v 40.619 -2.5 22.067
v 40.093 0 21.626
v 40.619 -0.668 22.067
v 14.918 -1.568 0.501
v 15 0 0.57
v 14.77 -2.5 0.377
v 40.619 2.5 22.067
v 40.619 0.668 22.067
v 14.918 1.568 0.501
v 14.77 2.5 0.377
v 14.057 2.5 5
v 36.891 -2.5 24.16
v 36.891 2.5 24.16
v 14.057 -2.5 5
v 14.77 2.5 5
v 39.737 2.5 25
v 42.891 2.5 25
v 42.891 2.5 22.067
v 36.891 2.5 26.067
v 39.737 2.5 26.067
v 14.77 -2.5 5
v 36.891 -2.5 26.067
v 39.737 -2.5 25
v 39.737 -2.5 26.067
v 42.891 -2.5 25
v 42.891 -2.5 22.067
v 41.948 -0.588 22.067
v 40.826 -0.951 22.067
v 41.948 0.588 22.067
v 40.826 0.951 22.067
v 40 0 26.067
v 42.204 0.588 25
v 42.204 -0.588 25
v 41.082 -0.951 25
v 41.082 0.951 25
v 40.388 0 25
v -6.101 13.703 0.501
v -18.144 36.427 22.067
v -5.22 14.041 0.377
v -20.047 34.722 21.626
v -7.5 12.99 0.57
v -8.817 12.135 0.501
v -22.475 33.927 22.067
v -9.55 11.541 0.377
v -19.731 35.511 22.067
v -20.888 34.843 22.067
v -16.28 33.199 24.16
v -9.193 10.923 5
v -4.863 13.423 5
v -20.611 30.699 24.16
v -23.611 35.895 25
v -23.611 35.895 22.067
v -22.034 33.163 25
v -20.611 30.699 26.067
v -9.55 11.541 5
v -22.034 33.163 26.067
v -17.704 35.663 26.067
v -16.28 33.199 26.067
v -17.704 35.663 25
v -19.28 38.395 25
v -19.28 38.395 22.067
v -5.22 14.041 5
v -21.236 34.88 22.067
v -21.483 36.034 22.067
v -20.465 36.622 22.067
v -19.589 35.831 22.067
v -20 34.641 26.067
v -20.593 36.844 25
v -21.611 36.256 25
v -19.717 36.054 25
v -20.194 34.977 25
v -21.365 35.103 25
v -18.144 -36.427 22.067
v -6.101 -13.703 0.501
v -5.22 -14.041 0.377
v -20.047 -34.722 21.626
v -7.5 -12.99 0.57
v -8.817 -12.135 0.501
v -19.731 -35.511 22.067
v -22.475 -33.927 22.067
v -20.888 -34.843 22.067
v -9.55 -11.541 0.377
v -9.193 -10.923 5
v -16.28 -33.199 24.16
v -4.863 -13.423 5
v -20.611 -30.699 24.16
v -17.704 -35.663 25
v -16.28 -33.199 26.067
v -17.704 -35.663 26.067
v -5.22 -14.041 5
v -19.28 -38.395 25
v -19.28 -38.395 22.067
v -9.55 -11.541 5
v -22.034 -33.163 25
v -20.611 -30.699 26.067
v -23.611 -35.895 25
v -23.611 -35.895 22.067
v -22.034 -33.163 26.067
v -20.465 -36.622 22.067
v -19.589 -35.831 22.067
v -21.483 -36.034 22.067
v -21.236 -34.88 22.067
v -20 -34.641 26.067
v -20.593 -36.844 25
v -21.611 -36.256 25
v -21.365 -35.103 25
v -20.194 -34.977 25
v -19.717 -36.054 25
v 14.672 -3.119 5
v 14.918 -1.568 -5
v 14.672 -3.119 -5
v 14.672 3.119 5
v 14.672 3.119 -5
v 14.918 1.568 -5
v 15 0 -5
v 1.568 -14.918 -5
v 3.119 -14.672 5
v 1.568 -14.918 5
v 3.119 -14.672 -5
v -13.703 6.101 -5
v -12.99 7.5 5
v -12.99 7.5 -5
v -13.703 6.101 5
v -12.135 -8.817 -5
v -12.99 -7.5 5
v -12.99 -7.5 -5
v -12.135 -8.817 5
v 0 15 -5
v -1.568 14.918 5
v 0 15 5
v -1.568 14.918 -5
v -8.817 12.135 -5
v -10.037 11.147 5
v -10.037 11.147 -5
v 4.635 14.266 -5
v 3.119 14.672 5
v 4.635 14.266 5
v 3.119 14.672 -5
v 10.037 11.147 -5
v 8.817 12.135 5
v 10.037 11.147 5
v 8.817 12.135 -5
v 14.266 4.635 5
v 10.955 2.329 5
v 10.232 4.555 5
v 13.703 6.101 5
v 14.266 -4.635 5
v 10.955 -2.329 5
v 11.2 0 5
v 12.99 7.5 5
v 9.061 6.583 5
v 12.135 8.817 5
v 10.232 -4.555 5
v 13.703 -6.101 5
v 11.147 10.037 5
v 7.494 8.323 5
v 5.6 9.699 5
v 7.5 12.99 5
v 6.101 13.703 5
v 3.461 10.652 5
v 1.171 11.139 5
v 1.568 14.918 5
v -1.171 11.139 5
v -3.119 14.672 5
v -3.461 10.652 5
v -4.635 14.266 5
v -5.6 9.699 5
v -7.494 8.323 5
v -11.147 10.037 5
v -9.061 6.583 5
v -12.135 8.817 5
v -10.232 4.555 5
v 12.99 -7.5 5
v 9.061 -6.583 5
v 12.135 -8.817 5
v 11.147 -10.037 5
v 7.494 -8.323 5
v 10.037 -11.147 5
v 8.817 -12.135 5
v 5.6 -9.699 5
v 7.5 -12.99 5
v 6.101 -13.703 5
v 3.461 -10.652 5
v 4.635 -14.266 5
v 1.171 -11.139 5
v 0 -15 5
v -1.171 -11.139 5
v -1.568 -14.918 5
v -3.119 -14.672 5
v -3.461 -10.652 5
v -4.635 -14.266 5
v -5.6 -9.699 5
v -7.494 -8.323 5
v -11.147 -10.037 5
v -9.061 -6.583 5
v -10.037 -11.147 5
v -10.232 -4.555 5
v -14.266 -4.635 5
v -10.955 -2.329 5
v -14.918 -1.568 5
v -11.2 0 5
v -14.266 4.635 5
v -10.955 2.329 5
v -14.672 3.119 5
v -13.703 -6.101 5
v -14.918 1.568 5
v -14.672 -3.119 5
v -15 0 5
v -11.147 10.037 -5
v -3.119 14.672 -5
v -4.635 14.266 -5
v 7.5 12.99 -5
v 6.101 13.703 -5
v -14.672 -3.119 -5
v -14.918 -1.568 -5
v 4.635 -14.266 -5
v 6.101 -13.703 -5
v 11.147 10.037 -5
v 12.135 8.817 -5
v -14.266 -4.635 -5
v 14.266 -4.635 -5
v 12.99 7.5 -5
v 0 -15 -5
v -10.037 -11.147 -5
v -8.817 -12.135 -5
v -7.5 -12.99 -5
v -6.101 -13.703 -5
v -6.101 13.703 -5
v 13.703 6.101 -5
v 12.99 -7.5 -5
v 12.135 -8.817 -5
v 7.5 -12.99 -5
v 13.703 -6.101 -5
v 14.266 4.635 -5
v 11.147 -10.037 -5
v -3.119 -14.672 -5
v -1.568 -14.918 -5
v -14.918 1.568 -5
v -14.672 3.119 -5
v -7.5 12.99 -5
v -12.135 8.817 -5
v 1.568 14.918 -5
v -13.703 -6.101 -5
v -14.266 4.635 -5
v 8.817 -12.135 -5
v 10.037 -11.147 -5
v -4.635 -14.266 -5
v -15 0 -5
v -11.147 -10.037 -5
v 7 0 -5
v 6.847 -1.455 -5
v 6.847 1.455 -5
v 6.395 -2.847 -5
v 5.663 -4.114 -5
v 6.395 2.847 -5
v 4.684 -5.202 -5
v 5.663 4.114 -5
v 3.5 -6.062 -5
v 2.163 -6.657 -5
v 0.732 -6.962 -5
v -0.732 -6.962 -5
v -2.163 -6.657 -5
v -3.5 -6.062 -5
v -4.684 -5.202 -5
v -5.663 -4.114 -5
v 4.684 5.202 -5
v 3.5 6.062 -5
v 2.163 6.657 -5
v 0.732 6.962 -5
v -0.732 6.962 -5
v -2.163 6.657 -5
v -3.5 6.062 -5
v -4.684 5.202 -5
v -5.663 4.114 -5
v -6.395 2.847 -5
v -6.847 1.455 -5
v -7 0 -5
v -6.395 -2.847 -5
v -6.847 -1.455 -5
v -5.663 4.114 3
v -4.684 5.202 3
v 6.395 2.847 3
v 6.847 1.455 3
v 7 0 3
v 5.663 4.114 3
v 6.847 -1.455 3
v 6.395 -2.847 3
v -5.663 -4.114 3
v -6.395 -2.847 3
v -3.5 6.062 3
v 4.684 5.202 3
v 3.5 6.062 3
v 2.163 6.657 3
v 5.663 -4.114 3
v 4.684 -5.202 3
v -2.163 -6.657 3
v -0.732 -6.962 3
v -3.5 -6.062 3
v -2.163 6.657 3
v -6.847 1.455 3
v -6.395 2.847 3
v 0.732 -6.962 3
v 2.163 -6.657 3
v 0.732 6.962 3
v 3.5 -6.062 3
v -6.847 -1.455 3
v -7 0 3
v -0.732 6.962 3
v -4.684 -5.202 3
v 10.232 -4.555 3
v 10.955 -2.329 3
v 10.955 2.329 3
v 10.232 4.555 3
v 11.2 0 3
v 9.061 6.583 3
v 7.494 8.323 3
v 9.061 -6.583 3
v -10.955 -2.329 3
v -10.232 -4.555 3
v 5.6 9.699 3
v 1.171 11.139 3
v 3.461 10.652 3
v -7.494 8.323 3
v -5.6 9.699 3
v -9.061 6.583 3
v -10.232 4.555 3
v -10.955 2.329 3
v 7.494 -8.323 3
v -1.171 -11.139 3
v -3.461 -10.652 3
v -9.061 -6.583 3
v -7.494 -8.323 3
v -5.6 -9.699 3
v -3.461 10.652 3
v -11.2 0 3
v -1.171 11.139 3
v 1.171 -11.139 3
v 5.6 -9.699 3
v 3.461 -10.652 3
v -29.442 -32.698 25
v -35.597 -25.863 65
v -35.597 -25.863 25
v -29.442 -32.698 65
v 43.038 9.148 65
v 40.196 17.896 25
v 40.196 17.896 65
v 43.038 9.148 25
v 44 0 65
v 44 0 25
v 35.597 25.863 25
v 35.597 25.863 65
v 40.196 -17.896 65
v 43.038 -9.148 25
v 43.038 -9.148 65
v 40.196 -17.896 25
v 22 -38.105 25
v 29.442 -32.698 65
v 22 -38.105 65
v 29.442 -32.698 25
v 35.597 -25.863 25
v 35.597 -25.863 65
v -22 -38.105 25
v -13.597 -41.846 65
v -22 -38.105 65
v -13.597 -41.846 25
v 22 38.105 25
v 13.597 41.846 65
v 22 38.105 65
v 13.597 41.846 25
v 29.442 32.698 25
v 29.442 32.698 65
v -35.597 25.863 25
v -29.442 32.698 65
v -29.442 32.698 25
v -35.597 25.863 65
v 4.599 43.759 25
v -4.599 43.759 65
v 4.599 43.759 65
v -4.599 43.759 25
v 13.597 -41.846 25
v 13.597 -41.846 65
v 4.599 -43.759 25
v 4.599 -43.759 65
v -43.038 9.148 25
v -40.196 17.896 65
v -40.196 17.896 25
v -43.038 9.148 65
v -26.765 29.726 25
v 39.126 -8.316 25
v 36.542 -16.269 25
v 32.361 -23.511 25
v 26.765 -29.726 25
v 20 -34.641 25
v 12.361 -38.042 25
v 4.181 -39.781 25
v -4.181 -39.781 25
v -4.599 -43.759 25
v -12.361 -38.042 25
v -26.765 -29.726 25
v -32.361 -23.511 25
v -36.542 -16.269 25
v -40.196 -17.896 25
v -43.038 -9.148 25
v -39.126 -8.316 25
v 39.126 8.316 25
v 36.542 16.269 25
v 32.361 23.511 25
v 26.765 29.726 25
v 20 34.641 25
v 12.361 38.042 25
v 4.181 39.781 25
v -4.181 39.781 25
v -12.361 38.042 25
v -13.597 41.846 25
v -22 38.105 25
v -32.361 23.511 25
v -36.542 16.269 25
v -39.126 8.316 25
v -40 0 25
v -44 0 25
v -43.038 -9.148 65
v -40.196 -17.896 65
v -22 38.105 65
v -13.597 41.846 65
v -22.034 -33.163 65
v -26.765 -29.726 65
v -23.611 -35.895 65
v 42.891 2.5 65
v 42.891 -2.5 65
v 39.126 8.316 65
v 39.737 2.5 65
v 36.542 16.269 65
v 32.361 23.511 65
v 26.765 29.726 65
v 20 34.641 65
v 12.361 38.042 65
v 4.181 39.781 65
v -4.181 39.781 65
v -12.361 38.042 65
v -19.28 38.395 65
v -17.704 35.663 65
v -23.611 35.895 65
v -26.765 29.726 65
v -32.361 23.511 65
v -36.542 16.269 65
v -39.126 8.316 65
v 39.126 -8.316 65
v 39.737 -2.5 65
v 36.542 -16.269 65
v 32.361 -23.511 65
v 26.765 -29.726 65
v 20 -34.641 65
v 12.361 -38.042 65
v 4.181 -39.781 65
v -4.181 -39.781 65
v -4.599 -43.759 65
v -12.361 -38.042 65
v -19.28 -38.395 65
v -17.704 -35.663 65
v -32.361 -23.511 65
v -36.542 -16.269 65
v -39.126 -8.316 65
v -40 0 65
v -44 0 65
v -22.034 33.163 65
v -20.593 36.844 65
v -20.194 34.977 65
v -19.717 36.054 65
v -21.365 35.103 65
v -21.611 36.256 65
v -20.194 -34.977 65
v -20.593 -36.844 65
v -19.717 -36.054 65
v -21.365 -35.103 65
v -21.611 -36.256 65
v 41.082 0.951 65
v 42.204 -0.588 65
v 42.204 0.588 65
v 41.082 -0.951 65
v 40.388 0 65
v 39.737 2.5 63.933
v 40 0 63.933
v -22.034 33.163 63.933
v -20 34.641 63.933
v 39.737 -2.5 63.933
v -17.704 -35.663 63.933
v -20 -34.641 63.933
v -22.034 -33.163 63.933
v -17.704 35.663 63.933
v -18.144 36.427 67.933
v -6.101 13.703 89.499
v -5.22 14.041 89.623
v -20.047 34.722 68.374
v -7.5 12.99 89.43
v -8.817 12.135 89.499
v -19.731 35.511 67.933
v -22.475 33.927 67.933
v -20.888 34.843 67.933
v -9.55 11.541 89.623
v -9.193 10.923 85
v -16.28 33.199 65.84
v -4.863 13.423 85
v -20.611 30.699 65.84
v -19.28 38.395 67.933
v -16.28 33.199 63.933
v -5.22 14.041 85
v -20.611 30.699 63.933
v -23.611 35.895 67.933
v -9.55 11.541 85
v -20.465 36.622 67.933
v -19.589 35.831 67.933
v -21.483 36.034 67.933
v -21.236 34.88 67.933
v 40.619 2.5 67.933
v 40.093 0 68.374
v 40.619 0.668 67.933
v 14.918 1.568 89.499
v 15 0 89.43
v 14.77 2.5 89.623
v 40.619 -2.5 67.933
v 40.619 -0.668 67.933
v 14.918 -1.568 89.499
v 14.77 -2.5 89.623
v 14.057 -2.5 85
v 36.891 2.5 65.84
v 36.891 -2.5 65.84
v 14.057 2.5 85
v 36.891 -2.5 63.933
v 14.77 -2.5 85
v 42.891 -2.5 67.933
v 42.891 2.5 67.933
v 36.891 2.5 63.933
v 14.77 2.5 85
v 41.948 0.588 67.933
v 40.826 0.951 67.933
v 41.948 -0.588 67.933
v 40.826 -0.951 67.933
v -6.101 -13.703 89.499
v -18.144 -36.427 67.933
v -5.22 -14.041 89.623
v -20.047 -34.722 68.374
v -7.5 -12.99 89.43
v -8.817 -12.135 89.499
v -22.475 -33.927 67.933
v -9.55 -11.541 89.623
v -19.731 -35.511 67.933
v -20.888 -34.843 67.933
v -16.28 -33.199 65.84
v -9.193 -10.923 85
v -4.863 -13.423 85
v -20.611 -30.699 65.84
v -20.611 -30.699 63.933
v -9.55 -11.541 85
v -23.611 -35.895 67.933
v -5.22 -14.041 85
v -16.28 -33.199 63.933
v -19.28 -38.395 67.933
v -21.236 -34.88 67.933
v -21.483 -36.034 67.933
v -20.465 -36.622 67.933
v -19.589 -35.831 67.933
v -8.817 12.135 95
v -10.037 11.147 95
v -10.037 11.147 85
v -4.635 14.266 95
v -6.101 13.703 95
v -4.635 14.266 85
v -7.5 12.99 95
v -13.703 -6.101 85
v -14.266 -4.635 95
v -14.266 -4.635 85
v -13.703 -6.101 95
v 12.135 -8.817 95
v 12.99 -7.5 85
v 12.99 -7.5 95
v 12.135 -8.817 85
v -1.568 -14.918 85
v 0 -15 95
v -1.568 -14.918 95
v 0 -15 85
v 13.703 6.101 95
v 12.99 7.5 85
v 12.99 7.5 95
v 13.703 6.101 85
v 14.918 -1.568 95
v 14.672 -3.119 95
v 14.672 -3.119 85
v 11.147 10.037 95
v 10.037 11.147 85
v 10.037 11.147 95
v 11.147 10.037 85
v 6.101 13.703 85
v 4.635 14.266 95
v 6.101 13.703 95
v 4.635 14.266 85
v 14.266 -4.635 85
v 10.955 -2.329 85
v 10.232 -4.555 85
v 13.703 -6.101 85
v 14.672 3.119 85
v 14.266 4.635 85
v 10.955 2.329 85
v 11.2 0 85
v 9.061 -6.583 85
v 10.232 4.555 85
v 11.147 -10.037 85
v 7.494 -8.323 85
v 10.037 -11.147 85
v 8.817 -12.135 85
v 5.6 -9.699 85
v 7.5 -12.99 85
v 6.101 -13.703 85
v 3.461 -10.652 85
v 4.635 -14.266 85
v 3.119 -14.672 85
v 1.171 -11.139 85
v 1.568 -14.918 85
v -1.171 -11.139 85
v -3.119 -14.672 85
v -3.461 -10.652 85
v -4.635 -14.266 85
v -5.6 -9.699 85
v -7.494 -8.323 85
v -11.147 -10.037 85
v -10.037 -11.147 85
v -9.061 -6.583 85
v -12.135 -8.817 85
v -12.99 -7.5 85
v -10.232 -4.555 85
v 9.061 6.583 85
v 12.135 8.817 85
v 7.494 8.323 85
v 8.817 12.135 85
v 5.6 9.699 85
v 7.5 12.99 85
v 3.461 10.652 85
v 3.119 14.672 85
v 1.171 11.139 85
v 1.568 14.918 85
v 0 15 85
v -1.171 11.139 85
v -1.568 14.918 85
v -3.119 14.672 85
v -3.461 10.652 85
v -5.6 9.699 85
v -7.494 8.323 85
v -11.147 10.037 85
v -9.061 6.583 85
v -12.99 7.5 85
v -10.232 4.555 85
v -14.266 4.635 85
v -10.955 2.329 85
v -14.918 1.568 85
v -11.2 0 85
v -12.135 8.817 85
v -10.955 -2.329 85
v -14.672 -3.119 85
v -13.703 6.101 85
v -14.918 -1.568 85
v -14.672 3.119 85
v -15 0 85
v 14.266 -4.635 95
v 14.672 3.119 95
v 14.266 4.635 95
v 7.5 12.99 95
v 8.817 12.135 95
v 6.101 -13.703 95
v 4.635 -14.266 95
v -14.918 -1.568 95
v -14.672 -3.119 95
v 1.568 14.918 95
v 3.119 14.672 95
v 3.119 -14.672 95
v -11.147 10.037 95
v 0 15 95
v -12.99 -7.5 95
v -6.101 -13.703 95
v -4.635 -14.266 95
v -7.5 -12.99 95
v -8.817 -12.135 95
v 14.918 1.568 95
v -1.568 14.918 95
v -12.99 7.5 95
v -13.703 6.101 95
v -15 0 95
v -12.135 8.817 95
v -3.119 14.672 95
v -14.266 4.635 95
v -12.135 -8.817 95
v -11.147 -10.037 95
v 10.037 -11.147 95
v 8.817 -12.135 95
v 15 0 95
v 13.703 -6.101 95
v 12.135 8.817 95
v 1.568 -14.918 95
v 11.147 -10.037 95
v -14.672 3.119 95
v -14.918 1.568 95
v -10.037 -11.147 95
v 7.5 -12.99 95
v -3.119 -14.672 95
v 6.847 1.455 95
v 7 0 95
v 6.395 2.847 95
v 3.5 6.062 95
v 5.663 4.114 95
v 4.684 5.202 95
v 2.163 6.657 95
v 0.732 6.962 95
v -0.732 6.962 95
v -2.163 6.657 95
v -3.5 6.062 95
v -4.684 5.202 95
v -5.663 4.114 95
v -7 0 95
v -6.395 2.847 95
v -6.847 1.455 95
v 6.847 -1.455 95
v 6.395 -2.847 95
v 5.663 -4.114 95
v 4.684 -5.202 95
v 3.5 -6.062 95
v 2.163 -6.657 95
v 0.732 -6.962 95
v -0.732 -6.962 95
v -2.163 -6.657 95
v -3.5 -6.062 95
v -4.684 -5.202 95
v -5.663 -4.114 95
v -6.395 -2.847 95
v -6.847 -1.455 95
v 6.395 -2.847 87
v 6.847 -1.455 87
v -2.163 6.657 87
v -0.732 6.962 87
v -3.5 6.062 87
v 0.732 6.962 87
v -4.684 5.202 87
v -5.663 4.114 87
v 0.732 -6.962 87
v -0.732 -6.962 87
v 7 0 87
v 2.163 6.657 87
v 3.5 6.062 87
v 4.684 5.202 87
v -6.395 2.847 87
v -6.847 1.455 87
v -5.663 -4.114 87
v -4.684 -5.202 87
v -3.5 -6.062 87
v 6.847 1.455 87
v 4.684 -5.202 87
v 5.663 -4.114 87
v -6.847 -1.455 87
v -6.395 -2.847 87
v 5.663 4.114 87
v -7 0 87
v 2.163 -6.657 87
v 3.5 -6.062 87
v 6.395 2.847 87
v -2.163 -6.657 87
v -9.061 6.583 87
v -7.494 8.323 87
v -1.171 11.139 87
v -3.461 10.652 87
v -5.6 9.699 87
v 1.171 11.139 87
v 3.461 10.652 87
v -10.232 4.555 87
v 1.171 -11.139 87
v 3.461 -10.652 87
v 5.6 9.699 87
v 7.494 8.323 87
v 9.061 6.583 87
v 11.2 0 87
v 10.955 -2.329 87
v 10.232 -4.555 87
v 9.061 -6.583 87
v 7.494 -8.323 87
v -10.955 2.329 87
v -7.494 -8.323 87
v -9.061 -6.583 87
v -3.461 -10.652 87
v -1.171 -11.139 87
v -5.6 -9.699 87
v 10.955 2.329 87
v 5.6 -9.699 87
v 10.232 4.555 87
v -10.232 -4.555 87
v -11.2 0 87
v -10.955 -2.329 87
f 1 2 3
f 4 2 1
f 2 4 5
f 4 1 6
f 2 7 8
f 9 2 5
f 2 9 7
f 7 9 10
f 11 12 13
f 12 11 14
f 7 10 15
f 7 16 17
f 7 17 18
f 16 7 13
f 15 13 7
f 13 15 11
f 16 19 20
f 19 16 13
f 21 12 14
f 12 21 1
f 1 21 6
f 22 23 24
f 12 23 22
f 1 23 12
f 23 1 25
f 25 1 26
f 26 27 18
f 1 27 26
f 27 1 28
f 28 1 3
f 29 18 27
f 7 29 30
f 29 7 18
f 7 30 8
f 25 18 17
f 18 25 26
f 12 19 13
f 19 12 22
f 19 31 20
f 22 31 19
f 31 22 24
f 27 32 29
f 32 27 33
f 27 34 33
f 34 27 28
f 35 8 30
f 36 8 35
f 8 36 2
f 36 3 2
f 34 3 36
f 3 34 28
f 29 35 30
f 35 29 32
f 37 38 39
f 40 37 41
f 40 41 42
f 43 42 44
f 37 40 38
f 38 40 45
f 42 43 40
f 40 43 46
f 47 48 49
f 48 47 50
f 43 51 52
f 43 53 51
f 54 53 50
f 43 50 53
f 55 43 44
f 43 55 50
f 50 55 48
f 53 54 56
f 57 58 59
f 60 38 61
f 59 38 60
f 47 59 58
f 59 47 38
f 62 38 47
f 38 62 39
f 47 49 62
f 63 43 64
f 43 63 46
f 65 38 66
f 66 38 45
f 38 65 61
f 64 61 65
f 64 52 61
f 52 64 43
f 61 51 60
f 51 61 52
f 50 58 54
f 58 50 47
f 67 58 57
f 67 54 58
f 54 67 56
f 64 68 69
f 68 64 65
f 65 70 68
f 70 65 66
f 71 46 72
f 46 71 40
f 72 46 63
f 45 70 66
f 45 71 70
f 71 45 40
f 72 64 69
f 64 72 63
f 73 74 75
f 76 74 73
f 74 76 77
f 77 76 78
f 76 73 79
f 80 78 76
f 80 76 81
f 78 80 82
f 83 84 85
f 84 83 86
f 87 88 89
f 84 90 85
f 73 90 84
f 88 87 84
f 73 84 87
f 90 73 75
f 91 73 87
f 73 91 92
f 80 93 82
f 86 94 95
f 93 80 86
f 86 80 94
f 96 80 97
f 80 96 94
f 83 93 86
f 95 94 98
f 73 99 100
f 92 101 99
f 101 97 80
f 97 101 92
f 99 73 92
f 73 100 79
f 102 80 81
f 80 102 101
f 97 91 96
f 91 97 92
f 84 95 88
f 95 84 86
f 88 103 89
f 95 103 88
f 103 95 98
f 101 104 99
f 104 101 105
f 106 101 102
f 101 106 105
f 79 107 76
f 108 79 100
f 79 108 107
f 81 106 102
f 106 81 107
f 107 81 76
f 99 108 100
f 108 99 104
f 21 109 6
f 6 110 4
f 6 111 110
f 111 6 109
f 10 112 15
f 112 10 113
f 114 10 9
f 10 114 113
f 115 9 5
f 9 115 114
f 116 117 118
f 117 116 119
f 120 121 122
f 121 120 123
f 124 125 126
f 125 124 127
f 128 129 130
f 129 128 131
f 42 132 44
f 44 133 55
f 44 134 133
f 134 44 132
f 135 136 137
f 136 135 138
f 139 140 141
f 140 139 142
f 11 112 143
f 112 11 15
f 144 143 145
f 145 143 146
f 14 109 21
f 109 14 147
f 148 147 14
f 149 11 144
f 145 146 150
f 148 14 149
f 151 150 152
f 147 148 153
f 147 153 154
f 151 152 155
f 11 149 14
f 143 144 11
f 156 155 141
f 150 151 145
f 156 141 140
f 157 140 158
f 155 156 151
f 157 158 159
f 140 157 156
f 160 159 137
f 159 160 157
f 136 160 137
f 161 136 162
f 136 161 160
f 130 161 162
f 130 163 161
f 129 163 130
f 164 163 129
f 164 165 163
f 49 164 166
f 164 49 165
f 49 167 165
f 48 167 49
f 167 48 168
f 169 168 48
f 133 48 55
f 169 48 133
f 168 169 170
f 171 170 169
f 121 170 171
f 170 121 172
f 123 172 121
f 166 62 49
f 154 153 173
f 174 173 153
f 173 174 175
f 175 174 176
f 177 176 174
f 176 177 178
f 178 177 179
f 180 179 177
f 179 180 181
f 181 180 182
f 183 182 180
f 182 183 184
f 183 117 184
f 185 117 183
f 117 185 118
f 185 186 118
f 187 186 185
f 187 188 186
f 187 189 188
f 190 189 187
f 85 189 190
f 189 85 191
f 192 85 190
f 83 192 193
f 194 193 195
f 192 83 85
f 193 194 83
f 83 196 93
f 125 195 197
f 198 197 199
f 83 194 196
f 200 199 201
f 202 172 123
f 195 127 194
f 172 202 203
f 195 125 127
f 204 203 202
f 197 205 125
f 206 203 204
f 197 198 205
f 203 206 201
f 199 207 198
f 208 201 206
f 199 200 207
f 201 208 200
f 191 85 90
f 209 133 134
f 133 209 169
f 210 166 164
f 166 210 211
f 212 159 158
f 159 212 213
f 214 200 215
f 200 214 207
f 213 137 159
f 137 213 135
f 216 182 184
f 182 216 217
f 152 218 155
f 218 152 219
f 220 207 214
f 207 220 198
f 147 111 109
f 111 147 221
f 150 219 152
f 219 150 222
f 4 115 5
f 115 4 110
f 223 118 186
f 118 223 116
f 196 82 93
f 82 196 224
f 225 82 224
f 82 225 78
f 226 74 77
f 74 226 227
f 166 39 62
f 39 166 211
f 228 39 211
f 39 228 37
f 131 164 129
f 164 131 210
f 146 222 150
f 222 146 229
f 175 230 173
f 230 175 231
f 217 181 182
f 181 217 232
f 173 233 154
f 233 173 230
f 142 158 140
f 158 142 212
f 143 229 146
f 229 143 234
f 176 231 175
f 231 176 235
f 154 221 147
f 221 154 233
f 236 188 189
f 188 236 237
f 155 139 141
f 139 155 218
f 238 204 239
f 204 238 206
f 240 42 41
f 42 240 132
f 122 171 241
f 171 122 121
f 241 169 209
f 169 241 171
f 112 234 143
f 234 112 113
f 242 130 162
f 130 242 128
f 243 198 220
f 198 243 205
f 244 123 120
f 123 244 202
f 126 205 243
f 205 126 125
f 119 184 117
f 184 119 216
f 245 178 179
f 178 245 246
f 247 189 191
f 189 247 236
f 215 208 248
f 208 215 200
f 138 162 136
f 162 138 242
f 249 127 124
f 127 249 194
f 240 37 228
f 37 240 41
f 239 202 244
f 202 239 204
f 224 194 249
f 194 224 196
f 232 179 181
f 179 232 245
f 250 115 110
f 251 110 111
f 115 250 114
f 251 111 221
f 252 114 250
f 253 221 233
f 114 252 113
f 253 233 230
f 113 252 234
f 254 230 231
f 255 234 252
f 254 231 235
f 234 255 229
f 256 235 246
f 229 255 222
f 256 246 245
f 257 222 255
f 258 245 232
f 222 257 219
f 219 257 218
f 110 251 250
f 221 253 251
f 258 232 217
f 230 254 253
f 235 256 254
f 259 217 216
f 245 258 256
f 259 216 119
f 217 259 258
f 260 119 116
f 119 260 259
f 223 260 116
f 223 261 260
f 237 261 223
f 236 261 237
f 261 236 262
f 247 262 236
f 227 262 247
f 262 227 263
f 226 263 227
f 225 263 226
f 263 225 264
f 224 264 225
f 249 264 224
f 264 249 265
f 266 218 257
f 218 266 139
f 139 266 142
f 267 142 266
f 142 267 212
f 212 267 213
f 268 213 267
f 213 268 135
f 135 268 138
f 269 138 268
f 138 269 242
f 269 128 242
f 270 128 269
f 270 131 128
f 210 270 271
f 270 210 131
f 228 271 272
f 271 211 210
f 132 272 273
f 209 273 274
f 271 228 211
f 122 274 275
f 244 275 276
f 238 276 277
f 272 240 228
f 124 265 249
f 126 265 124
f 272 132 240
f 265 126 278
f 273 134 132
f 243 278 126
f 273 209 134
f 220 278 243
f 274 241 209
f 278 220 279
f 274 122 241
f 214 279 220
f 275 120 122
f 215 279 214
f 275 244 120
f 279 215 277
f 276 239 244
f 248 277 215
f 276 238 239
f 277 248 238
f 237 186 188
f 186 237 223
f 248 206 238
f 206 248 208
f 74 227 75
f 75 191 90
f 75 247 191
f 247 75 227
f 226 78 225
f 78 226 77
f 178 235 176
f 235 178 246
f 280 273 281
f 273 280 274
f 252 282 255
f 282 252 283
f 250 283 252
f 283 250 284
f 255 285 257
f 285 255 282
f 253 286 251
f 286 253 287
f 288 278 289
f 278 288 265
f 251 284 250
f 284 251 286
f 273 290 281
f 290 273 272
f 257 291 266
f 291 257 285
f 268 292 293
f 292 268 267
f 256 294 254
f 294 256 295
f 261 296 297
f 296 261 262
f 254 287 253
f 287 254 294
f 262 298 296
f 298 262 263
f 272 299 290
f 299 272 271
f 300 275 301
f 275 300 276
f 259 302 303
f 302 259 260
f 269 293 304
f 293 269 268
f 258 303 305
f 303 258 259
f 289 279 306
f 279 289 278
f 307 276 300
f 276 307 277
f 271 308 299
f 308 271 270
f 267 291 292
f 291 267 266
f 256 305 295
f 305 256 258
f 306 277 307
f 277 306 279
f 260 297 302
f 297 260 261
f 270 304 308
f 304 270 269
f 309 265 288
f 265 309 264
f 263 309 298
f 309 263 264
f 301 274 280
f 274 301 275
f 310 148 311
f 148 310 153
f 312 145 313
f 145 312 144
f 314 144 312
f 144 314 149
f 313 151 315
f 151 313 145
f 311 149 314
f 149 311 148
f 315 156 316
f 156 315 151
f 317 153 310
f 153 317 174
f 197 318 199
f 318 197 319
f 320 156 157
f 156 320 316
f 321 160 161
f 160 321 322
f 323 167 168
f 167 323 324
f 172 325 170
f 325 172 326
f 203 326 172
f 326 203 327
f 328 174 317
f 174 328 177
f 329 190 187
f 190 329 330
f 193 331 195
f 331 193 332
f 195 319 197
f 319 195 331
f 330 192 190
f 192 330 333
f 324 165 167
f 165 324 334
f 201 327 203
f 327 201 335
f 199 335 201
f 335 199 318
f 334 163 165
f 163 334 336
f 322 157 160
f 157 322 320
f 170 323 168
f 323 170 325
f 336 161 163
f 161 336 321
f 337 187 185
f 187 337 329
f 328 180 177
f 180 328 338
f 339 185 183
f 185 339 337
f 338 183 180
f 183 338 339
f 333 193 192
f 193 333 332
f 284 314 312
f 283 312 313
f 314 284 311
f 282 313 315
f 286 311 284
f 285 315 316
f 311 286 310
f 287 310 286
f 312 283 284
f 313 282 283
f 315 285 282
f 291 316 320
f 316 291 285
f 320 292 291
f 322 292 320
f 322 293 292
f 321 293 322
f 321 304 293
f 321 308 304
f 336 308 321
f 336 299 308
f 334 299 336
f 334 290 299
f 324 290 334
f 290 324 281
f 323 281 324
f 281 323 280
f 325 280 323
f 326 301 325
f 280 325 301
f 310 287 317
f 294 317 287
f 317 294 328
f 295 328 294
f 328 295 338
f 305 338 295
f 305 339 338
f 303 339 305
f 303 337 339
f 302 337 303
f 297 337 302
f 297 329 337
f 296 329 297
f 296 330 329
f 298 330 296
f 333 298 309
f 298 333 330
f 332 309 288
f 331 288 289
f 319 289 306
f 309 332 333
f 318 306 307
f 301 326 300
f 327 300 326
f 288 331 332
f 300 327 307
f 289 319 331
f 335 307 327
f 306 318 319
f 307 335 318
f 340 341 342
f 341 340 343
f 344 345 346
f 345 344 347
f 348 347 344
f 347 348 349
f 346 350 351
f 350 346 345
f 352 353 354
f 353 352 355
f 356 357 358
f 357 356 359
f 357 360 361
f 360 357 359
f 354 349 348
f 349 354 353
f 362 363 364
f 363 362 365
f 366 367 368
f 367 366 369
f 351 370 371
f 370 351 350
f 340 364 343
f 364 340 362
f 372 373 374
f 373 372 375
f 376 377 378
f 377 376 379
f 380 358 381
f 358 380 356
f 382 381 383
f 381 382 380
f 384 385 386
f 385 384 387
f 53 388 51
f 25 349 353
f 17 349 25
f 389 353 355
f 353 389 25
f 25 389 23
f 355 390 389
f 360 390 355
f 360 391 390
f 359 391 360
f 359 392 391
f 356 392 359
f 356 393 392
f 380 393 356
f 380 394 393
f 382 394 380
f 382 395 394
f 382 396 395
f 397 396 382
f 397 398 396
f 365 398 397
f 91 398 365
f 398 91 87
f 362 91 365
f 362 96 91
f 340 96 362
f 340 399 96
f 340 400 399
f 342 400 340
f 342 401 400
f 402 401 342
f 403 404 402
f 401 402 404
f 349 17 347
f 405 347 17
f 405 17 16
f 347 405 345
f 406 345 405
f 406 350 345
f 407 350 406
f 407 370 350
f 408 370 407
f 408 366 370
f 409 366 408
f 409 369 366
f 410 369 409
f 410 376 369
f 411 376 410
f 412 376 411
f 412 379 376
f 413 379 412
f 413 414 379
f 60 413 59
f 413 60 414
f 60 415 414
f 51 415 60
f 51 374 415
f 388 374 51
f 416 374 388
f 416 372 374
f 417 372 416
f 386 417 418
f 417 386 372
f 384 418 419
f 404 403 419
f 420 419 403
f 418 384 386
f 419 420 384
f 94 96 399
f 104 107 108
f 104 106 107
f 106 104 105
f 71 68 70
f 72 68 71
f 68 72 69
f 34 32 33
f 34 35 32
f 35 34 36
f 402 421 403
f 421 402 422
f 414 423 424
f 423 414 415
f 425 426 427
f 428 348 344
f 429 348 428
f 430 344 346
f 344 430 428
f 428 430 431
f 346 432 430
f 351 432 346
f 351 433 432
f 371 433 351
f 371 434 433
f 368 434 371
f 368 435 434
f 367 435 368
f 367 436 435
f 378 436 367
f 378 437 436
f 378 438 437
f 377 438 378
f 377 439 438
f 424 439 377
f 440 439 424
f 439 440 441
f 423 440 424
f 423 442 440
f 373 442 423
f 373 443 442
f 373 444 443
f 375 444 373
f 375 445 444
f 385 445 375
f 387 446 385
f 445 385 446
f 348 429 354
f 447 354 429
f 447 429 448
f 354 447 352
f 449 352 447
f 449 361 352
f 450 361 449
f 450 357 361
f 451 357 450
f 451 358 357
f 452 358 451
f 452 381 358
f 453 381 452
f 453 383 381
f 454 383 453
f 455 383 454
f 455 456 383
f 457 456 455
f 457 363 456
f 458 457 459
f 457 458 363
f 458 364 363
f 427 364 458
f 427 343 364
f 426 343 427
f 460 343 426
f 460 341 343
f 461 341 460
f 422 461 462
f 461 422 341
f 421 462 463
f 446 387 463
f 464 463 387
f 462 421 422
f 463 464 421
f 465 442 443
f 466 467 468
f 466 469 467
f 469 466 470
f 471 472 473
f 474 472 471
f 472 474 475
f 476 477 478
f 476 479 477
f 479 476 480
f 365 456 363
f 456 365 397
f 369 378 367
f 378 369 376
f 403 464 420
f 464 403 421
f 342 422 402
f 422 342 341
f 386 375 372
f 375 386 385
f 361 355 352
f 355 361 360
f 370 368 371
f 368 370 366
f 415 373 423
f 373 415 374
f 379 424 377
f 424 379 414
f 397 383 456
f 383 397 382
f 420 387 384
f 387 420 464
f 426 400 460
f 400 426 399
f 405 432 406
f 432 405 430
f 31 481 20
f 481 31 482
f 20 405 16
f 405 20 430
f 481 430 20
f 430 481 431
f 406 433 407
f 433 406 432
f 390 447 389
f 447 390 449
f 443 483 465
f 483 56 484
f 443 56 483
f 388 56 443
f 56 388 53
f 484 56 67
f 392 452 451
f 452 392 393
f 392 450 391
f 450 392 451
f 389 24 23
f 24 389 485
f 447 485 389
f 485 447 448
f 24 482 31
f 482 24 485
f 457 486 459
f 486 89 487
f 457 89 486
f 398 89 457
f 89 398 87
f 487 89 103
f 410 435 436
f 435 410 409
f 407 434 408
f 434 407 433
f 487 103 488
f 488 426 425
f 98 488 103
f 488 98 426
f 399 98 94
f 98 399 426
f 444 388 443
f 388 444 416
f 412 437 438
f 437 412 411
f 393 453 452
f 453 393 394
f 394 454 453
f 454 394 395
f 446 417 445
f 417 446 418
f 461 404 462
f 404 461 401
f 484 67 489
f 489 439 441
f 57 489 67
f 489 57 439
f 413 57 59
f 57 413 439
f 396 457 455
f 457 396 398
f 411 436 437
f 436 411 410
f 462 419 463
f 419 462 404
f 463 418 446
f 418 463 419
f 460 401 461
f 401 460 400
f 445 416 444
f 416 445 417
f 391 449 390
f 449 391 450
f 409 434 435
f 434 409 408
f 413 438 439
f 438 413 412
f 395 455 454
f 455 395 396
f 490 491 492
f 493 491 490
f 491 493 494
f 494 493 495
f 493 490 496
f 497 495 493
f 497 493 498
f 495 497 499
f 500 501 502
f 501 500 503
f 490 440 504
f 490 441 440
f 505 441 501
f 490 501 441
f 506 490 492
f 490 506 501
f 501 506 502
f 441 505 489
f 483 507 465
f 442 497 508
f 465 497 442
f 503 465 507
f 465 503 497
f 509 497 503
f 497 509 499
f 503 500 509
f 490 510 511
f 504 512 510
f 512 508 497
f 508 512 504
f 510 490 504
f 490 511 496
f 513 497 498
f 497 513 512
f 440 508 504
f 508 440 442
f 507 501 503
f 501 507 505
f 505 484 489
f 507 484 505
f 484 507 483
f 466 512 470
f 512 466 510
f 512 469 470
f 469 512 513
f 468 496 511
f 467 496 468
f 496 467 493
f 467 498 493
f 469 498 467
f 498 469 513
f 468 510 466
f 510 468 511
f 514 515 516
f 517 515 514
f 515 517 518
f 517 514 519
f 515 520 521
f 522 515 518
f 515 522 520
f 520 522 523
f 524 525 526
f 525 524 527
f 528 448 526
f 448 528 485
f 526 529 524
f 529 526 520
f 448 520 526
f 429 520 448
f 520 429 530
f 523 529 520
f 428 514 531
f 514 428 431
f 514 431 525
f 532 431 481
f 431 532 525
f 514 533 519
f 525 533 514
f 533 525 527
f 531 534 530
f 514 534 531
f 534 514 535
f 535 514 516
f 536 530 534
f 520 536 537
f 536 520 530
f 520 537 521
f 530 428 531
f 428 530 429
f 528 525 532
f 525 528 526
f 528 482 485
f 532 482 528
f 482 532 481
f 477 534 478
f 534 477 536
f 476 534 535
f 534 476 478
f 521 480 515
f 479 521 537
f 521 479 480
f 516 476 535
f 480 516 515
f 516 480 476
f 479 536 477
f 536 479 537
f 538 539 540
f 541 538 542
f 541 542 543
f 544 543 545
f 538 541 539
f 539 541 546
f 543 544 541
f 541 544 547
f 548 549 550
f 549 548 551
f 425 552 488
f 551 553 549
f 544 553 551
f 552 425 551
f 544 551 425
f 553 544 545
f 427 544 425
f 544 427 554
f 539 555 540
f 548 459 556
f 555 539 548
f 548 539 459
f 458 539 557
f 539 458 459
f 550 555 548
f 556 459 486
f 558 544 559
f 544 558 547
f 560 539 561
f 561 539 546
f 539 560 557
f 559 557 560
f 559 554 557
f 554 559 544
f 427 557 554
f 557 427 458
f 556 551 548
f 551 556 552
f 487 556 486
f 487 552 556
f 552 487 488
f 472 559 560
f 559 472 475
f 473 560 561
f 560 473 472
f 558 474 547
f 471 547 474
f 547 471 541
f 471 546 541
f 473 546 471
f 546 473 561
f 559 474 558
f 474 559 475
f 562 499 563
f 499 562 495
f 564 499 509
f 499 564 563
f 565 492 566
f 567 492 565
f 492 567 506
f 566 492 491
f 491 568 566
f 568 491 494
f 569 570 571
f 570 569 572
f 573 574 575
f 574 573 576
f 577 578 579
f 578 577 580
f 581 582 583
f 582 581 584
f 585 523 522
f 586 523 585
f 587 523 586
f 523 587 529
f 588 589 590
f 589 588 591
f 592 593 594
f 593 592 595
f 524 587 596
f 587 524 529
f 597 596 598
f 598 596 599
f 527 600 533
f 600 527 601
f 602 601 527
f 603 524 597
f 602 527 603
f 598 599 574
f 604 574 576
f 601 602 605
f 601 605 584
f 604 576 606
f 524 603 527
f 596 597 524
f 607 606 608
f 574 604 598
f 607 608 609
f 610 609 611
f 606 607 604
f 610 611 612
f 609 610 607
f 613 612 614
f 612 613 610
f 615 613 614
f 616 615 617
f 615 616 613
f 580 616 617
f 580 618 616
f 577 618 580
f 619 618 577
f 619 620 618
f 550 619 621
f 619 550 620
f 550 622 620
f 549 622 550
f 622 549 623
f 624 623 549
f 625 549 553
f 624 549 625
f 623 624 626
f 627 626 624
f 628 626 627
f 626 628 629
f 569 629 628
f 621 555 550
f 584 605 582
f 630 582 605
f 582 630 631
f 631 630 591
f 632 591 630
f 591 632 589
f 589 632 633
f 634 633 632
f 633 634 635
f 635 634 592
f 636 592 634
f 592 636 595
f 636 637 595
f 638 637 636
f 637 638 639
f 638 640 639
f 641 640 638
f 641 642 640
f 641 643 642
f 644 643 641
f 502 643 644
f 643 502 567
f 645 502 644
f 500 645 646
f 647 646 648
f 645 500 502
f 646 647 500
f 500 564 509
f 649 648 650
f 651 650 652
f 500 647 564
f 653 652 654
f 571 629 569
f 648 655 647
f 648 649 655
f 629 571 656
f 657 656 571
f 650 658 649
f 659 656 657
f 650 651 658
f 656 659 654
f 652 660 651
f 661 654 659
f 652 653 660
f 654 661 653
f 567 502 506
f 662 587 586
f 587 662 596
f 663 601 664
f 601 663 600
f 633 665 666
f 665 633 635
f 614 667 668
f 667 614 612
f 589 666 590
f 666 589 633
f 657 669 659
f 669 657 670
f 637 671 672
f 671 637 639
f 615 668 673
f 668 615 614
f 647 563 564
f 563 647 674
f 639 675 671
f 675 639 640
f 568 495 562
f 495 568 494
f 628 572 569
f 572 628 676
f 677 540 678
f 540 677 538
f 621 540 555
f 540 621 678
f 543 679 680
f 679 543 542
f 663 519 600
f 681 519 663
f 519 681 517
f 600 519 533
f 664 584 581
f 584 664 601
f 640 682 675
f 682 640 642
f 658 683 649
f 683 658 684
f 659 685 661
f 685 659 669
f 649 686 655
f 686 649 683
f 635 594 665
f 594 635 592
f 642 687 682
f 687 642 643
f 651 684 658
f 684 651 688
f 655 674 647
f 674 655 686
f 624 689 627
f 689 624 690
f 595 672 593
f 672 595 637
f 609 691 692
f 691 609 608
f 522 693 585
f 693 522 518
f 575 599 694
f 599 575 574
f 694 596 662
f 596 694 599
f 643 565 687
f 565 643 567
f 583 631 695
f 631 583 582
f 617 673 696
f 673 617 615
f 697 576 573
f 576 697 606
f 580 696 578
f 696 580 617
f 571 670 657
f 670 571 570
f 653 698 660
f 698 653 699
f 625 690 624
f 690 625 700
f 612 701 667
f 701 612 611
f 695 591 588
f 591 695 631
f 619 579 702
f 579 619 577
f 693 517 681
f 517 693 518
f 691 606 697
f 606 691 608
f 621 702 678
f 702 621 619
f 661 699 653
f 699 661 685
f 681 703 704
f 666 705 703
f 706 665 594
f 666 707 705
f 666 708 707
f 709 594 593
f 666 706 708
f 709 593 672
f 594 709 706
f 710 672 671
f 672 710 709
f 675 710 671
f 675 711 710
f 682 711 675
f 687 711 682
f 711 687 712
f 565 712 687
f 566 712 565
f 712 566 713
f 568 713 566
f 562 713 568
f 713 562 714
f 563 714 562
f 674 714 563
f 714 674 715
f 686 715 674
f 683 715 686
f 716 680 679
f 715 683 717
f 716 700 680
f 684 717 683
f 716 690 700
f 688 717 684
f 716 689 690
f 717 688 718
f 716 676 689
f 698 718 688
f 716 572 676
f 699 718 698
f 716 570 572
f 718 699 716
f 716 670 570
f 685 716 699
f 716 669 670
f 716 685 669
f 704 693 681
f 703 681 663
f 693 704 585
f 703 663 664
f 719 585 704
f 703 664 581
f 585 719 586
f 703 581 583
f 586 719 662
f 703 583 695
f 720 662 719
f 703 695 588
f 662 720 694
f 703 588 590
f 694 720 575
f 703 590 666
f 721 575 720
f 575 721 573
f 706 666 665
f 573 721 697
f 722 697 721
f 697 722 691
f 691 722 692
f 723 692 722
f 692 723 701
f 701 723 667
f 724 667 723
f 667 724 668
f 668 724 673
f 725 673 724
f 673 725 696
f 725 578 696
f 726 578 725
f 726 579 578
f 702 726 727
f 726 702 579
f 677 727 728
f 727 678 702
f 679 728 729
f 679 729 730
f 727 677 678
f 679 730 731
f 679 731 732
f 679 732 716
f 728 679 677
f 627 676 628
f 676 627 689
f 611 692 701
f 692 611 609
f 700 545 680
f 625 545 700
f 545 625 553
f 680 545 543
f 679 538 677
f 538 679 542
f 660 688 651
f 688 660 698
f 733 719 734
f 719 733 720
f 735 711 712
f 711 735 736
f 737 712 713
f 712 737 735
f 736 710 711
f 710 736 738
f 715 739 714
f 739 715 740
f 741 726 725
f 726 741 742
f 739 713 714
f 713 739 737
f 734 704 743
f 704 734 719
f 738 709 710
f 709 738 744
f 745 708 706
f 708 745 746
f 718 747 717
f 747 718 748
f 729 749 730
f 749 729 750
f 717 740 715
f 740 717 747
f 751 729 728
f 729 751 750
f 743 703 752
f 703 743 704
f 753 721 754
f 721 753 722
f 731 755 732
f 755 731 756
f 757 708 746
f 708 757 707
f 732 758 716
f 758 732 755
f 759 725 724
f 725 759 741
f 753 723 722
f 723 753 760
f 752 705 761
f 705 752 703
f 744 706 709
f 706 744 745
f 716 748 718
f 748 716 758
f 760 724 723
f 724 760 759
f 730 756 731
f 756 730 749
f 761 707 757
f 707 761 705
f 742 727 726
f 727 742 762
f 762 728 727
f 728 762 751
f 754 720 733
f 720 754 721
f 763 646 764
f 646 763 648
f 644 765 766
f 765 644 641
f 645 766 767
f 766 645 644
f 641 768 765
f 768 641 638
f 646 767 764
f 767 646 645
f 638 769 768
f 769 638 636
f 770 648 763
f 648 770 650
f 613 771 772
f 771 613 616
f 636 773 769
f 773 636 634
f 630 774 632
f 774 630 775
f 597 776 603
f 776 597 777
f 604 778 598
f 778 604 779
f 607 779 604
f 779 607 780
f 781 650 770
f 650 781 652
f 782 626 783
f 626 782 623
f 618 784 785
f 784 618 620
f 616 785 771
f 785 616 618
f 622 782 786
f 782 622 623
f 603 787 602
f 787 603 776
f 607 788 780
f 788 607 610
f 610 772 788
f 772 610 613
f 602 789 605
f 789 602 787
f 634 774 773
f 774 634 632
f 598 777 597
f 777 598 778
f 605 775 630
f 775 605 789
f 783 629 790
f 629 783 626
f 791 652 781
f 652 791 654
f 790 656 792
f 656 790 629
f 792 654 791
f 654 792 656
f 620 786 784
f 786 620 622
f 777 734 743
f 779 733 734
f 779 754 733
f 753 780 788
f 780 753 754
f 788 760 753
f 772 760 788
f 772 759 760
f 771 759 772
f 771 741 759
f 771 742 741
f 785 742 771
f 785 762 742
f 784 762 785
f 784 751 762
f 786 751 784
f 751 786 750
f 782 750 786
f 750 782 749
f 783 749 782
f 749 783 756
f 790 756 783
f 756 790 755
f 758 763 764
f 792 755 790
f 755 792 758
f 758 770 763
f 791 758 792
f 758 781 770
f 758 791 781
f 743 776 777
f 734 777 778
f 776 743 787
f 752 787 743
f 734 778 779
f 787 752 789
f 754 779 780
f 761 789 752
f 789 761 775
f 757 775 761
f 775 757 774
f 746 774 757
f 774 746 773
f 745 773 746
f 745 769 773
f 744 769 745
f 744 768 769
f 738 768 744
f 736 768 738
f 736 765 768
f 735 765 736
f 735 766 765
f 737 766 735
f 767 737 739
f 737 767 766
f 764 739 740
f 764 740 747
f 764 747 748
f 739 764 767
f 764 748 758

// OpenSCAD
hpezzo=10;
rpezzo=15;
hcuscinetto=7.2;
rcuscinetto=11.2;

module porta_cuscinetto(ph,h,r) {
 difference(){
  children();
  translate([0,0,ph-(h-0.2)])cylinder(h,r,r,$fn=30);
 }
}

module foro_asse(ph,h,r) {
 difference(){
  children();
  translate([0,0,ph-(h-0.2)])cylinder(h,r,r,$fn=30);
 }
}


module braccio(){
    l=40;
    //a=40;
    a=40;
    difference(){
    union(){
    cube([4,5,l],true);
    translate([0,0,20])rotate(a,[0,1,0])cube([4,5,6],true);
    }
        
         //cube([4,5,5],true);
    translate([0,0,22])rotate(135,[0,1,0])cylinder(10,1,1,true);
    }
        
        
}
// parte_anteriore
module parte_anteriore(){
union(){
for(i=[0,120,240]){
  porta_cuscinetto(hpezzo,hcuscinetto,rcuscinetto)rotate(i,[0,0,1])translate([13,0,25])rotate(50,[0,1,0])translate([18,0,0])braccio();
    
}
porta_cuscinetto(hpezzo,hcuscinetto,rcuscinetto)foro_asse(10,20,7)cylinder(hpezzo,rpezzo,rpezzo,true,$fn=60);
}
}

// ANELLO
module anello(){
    difference(){
        difference(){
            translate([0,0,45])cylinder(40,44,44,true);
            translate([0,0,45])cylinder(42,40,40,true);
        }
    
        parte_anteriore();
    
    }
}

parte_anteriore();
anello();
translate([0,0,90])rotate(180,[0,1,0])rotate(60,[0,0,1])parte_anteriore();
